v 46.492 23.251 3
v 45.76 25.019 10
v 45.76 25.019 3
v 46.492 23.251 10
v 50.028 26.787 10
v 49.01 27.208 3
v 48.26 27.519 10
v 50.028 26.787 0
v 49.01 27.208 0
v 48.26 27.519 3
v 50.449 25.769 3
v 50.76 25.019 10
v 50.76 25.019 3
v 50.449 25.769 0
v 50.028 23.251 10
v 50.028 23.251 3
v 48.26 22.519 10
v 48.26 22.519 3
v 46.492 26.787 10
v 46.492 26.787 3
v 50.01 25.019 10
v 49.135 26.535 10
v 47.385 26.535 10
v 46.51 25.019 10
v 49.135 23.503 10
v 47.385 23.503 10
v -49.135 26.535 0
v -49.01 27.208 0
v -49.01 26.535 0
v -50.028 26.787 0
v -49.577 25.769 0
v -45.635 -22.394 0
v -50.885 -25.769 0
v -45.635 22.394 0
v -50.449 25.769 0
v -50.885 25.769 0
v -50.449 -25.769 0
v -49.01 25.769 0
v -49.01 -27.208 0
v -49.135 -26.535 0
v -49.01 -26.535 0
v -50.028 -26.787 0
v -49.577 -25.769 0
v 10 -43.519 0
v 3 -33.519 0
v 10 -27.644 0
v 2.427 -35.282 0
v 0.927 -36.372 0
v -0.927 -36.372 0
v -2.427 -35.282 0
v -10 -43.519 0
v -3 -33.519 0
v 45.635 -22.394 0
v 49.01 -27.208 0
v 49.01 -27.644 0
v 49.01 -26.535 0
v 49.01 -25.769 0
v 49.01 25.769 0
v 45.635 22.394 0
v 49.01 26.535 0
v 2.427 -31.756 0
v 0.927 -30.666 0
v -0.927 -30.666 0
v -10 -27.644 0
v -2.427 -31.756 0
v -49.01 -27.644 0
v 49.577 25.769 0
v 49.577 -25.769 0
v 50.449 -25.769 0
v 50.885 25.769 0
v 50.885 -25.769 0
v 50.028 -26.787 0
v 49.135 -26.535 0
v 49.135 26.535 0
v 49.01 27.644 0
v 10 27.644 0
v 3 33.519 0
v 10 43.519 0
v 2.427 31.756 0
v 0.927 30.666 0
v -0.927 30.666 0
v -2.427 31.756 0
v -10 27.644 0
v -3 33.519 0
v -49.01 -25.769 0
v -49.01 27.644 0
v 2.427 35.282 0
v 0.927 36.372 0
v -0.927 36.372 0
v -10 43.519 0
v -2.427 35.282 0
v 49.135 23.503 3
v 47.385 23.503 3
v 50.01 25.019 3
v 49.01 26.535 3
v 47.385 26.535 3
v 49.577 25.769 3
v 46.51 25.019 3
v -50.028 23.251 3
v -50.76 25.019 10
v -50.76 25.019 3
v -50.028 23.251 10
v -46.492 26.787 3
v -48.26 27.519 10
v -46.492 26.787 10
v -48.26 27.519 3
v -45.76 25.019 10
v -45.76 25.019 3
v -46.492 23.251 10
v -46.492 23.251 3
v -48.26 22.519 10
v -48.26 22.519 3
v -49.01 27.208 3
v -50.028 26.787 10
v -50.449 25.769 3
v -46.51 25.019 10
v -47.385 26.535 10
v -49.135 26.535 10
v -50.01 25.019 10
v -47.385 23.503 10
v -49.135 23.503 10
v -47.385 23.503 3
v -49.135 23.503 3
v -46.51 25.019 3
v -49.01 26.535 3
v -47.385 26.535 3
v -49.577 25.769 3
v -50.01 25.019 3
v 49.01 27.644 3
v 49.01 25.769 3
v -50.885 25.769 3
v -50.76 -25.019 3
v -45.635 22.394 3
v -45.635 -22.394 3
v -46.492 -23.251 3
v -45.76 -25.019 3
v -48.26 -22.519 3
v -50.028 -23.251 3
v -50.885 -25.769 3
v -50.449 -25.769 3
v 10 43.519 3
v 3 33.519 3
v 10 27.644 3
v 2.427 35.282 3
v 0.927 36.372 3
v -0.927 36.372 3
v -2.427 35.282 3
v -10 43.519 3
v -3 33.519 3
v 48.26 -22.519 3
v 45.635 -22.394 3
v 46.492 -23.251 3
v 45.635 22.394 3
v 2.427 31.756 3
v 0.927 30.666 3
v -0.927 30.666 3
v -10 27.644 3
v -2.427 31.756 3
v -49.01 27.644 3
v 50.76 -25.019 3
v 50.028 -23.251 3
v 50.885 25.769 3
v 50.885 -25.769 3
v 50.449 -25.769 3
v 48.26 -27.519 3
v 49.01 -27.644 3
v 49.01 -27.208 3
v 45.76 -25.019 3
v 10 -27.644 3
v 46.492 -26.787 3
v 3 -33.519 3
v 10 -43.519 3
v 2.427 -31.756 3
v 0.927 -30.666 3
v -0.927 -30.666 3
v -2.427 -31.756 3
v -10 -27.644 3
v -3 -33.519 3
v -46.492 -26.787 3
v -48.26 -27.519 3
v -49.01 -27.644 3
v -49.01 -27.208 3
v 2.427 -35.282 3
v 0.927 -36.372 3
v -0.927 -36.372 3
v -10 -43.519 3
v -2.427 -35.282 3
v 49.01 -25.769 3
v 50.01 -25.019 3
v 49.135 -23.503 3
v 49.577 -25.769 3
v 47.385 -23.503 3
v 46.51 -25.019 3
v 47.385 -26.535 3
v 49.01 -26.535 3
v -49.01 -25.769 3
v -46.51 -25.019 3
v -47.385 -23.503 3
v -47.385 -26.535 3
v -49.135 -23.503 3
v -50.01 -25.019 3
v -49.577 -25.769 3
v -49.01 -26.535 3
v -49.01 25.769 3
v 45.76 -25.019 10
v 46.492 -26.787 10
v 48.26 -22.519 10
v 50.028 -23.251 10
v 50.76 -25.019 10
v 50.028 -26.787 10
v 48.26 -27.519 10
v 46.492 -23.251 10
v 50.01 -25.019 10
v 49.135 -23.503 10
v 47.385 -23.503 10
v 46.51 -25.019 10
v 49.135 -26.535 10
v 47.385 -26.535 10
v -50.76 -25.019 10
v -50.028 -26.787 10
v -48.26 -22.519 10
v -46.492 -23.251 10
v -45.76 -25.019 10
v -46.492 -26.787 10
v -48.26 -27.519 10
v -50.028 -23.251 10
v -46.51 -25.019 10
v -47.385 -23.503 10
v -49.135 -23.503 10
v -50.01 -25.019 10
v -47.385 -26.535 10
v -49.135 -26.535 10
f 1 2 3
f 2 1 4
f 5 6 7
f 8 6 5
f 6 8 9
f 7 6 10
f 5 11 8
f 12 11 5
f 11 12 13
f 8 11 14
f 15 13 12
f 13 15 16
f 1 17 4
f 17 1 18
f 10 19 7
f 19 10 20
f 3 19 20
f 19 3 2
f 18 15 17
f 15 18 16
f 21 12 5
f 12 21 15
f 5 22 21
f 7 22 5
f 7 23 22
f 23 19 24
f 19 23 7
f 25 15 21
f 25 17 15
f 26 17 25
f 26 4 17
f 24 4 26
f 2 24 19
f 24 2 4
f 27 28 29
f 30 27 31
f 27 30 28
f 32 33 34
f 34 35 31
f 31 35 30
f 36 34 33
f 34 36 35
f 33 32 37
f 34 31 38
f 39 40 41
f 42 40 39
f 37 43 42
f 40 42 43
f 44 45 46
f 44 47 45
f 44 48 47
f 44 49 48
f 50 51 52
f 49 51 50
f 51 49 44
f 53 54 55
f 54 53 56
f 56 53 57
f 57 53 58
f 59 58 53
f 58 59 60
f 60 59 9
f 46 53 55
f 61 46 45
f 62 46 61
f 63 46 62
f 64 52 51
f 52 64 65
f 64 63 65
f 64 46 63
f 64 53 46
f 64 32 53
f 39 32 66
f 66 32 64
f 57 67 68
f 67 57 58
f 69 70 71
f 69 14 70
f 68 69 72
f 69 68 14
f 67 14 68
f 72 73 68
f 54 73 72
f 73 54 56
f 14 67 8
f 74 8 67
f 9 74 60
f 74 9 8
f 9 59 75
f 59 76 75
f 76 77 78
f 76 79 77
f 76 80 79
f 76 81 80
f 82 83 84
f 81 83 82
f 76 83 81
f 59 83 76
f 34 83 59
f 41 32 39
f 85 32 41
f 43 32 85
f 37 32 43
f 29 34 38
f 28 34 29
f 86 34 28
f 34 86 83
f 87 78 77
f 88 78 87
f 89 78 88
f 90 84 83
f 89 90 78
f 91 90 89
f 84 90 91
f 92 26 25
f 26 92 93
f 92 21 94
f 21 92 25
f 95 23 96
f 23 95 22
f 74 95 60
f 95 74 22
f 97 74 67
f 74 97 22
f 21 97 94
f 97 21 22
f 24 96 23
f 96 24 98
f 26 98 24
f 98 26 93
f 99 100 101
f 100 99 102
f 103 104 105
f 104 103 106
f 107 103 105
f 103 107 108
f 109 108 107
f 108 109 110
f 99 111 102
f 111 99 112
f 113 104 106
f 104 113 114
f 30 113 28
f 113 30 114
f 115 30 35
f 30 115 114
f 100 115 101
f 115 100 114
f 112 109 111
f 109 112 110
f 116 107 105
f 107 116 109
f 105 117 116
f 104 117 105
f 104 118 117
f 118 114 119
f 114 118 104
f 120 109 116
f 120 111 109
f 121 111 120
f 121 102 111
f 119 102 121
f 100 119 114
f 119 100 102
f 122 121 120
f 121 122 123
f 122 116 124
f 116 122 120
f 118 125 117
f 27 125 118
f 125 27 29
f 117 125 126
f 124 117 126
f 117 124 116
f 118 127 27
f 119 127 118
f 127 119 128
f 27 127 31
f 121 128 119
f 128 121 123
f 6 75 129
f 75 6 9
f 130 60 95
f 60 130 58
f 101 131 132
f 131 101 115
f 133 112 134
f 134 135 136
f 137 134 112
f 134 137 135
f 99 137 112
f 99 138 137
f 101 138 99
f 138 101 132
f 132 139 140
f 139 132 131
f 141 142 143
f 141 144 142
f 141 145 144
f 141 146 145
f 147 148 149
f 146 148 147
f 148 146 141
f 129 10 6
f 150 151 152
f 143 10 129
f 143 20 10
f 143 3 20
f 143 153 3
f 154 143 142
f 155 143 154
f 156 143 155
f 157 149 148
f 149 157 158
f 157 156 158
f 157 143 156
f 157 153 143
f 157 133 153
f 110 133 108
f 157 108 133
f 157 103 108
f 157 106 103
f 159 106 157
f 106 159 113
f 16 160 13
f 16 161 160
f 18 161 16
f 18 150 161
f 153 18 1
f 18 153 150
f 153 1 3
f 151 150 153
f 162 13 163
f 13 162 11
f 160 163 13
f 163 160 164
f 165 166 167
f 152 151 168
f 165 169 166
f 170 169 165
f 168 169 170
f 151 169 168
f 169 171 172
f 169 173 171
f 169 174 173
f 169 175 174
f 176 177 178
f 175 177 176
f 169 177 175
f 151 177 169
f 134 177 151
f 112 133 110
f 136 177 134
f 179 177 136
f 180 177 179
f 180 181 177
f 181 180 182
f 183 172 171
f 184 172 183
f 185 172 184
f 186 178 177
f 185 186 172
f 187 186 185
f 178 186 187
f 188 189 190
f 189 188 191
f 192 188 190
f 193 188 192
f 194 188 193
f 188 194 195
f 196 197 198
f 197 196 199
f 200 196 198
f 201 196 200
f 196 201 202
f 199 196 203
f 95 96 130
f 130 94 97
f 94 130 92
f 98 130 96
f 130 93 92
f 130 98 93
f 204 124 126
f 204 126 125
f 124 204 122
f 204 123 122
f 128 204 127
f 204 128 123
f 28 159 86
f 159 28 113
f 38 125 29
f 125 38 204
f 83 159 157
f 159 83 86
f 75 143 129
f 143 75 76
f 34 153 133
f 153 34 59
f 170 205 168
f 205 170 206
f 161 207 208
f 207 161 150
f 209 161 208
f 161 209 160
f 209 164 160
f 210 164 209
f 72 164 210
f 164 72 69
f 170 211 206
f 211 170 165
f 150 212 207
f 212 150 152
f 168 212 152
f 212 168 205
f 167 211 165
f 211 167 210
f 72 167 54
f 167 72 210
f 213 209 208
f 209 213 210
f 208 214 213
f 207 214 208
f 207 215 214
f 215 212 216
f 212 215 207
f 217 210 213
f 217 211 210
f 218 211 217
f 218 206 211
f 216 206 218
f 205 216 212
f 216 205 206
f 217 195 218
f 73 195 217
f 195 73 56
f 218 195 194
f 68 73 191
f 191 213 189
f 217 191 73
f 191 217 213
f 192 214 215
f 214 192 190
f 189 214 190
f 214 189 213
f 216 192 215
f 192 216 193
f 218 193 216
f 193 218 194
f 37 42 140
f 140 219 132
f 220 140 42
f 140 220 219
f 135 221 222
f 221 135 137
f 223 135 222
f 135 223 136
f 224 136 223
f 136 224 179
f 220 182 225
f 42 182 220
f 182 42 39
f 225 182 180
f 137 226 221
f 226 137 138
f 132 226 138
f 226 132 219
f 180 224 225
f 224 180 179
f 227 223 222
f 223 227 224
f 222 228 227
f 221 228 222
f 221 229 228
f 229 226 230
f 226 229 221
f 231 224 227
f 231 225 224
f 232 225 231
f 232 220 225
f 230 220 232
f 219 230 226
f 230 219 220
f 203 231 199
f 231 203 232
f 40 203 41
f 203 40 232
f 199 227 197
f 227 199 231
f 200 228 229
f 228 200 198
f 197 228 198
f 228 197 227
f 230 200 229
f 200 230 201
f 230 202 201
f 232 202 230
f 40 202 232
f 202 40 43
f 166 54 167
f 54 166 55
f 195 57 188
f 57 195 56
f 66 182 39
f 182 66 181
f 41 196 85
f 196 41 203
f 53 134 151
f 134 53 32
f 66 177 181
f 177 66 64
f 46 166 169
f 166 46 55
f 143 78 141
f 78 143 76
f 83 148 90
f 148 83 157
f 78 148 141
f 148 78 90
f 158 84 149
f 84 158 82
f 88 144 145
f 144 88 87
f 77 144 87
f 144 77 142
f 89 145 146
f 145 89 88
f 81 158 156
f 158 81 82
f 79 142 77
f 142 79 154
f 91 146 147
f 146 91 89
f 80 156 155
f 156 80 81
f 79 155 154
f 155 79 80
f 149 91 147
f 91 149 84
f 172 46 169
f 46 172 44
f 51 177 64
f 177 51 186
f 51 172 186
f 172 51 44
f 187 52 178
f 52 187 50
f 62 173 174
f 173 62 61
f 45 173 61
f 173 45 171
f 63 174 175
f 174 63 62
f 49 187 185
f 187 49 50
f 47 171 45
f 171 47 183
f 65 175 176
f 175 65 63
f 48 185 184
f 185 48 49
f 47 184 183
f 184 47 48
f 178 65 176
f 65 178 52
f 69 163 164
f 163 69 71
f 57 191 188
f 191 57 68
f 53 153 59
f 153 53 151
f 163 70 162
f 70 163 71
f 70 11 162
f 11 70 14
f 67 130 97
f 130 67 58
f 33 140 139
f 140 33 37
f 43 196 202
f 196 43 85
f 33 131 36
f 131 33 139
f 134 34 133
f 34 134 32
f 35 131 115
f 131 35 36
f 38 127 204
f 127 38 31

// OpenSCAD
union() {
	translate(v = [0, 25.0190000000, 0]) {
		union() {
			translate(v = [0, 0, 1.5000000000]) {
				cube(center = true, size = [98.0200000000, 5.2500000000, 3]);
			}
			translate(v = [48.2600000000, 0, 0]) {
				difference() {
					cylinder(d = 5, h = 10);
					cylinder(d = 3.5000000000, h = 10);
				}
			}
			translate(v = [-48.2600000000, 0, 0]) {
				difference() {
					cylinder(d = 5, h = 10);
					cylinder(d = 3.5000000000, h = 10);
				}
			}
		}
	}
	translate(v = [0, -25.0190000000, 0]) {
		union() {
			translate(v = [0, 0, 1.5000000000]) {
				cube(center = true, size = [98.0200000000, 5.2500000000, 3]);
			}
			translate(v = [48.2600000000, 0, 0]) {
				difference() {
					cylinder(d = 5, h = 10);
					cylinder(d = 3.5000000000, h = 10);
				}
			}
			translate(v = [-48.2600000000, 0, 0]) {
				difference() {
					cylinder(d = 5, h = 10);
					cylinder(d = 3.5000000000, h = 10);
				}
			}
		}
	}
	translate(v = [48.2600000000, 0, 0]) {
		rotate(a = [0, 0, 90]) {
			translate(v = [0, 0, 1.5000000000]) {
				cube(center = true, size = [51.5380000000, 5.2500000000, 3]);
			}
		}
	}
	translate(v = [-48.2600000000, 0, 0]) {
		rotate(a = [0, 0, 90]) {
			translate(v = [0, 0, 1.5000000000]) {
				cube(center = true, size = [51.5380000000, 5.2500000000, 3]);
			}
		}
	}
	translate(v = [0, 33.5190000000, 0]) {
		difference() {
			translate(v = [0, 0, 1.5000000000]) {
				cube(center = true, size = [20, 20, 3]);
			}
			cylinder(d = 6, h = 30);
		}
	}
	translate(v = [0, -33.5190000000, 0]) {
		difference() {
			translate(v = [0, 0, 1.5000000000]) {
				cube(center = true, size = [20, 20, 3]);
			}
			cylinder(d = 6, h = 30);
		}
	}
}
